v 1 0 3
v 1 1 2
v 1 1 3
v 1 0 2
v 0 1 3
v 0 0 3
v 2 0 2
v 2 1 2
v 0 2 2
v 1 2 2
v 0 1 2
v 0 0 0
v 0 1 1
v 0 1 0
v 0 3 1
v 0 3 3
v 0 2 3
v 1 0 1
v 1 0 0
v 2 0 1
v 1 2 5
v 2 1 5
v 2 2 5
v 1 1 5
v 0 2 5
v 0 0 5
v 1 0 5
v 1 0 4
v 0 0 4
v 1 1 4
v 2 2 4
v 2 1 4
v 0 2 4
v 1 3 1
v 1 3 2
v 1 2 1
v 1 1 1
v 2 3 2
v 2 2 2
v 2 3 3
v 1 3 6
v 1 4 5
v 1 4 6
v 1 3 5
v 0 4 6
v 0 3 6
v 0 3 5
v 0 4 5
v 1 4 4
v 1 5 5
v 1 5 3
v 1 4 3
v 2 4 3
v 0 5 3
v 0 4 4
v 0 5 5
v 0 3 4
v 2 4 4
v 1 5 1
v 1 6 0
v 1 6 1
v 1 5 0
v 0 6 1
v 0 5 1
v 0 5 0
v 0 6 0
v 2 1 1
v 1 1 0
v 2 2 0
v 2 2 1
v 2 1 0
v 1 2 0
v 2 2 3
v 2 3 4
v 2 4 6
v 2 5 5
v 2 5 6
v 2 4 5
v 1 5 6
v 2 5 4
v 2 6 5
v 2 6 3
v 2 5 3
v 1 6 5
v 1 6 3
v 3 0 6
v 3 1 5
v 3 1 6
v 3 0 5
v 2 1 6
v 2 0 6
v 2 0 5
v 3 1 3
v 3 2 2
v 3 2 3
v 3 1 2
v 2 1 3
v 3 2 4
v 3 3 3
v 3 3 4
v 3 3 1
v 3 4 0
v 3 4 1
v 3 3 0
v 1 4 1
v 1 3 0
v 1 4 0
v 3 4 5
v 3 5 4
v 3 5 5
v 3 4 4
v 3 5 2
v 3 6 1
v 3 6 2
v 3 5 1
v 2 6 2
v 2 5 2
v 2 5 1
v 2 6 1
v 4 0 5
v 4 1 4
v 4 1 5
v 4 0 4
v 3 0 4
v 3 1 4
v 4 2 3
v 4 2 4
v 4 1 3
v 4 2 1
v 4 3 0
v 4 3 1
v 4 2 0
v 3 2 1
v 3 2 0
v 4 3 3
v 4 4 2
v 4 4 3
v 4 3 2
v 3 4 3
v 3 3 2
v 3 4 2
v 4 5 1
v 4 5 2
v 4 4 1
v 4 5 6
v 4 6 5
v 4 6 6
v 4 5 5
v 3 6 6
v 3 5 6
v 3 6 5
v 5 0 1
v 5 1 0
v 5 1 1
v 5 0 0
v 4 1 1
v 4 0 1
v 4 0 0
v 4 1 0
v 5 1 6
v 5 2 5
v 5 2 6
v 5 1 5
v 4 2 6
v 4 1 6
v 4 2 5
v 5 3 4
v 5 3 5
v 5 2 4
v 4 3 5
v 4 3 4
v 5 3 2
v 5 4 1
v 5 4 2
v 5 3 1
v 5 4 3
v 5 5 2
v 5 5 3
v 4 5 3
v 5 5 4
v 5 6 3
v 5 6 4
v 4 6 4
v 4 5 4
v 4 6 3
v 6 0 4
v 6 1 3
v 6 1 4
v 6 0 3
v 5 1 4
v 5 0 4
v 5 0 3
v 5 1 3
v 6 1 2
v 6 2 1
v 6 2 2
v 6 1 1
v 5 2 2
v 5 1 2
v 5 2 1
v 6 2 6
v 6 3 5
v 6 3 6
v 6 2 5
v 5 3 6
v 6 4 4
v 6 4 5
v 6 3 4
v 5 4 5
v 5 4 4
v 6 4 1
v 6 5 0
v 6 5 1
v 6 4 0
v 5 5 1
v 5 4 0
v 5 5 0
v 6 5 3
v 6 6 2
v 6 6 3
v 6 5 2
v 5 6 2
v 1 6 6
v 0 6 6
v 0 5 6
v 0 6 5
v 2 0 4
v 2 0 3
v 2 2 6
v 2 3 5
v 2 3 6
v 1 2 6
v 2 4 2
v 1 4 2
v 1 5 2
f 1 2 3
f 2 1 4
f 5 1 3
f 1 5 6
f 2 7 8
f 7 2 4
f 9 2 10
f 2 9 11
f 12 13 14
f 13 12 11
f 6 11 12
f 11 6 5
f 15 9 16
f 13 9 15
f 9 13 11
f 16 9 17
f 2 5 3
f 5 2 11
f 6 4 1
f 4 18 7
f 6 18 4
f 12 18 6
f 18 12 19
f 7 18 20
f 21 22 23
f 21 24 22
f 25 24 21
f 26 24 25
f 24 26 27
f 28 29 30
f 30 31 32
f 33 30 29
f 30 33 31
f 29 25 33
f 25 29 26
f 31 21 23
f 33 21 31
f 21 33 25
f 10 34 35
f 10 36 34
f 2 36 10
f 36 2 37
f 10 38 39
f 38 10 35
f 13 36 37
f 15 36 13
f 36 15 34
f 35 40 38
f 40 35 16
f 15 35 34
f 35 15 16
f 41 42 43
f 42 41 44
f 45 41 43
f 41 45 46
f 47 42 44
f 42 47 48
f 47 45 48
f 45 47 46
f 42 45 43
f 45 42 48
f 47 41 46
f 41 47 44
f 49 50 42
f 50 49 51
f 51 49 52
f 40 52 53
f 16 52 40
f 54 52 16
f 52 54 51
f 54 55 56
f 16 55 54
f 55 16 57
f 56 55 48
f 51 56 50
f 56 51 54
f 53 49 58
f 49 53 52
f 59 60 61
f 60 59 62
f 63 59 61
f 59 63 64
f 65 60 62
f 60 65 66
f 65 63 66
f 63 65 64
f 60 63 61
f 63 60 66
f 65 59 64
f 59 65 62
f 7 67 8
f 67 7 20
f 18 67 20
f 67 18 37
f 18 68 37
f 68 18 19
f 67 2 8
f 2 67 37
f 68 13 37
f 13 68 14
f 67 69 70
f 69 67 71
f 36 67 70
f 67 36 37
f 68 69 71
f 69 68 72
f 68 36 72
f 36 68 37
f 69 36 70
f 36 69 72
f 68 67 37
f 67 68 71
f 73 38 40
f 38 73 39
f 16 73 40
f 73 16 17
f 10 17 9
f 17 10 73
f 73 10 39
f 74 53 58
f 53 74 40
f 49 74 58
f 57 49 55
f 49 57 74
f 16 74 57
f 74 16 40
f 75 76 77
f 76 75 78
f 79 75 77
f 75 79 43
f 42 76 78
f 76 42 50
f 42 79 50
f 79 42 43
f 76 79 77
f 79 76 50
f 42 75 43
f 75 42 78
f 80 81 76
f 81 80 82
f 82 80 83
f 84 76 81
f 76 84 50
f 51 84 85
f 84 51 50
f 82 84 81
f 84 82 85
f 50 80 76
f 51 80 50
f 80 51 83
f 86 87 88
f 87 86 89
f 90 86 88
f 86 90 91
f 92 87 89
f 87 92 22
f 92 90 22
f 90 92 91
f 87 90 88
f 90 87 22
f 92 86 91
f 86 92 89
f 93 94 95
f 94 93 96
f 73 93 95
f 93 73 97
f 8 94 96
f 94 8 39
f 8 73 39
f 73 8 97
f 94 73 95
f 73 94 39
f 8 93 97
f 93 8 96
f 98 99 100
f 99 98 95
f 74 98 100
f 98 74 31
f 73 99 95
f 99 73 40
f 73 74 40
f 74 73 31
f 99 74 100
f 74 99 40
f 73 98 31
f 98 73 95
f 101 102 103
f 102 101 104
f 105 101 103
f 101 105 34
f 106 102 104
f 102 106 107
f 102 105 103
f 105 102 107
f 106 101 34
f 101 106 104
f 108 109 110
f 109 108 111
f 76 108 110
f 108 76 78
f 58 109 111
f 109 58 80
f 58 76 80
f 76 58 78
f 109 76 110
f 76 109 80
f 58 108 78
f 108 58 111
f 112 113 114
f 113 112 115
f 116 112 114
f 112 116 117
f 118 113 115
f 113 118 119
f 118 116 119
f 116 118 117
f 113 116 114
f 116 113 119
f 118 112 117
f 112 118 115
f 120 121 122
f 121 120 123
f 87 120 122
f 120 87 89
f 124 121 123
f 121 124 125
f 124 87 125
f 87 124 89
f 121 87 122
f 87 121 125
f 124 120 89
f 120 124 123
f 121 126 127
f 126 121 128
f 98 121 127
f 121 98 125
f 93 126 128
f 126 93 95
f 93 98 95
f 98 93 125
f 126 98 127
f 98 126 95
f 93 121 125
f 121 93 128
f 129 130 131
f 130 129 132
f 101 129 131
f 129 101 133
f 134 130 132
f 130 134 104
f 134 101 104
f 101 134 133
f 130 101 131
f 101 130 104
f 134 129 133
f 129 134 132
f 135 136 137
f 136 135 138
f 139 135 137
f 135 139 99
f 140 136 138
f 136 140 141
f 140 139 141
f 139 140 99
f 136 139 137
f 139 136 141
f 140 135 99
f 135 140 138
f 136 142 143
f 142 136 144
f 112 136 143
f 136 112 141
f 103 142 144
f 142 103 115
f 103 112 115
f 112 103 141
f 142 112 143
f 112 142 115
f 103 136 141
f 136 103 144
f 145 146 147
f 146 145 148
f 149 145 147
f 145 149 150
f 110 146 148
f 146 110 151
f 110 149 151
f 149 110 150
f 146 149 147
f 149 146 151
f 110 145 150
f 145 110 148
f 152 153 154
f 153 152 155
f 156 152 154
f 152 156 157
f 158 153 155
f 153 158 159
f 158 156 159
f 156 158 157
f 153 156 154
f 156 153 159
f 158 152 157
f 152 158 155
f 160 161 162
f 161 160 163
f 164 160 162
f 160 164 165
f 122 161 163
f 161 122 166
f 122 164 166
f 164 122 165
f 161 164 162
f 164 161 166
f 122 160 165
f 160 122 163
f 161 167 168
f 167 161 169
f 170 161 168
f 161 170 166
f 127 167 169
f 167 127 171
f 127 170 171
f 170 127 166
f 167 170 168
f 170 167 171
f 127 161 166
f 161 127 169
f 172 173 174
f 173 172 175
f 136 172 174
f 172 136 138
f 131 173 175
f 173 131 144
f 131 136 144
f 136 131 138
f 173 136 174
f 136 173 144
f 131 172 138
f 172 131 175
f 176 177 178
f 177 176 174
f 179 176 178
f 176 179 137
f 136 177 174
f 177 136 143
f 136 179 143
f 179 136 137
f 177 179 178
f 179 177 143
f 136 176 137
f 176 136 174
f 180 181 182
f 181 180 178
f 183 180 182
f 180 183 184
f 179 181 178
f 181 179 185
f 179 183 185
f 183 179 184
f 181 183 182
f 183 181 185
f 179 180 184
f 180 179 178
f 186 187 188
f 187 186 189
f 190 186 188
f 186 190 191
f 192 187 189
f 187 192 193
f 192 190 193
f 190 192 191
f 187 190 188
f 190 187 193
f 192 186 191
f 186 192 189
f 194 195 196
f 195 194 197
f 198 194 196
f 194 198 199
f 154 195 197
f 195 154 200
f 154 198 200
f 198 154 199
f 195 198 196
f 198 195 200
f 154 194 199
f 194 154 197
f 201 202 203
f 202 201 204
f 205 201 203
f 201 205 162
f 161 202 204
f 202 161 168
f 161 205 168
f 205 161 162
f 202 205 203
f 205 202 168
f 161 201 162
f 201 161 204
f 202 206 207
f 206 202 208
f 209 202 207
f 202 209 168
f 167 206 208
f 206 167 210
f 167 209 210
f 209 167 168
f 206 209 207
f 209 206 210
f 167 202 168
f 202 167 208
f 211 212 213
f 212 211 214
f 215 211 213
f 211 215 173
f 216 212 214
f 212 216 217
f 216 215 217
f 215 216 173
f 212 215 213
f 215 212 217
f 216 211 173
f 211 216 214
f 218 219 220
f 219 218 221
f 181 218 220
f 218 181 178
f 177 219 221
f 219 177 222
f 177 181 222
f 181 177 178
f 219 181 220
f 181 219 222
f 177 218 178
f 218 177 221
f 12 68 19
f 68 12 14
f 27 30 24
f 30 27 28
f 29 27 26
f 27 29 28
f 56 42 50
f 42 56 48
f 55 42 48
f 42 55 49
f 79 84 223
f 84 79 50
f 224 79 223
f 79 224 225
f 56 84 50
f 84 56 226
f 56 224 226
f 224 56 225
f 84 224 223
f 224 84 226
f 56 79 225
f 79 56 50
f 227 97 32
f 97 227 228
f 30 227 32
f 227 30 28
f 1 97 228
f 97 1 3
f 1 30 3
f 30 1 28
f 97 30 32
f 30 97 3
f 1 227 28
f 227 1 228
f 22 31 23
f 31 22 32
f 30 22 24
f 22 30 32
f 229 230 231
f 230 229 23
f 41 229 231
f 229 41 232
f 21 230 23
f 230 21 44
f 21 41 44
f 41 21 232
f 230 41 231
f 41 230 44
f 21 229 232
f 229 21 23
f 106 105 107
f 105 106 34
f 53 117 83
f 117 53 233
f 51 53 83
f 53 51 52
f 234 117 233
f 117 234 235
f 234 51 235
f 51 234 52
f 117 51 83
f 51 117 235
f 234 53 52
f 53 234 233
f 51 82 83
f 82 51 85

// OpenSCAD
union() {
    translate([0, 0, 2]) cube([1, 1, 1]);
    translate([0, 1, 4]) cube([1, 1, 1]);
    translate([0, 2, 1]) cube([1, 1, 1]);
    translate([0, 3, 5]) cube([1, 1, 1]);
    translate([0, 4, 3]) cube([1, 1, 1]);
    translate([0, 5, 0]) cube([1, 1, 1]);
    translate([1, 0, 1]) cube([1, 1, 1]);
    translate([1, 1, 0]) cube([1, 1, 1]);
    translate([1, 2, 2]) cube([1, 1, 1]);
    translate([1, 3, 3]) cube([1, 1, 1]);
    translate([1, 4, 5]) cube([1, 1, 1]);
    translate([1, 5, 4]) cube([1, 1, 1]);
    translate([2, 0, 5]) cube([1, 1, 1]);
    translate([2, 1, 2]) cube([1, 1, 1]);
    translate([2, 2, 3]) cube([1, 1, 1]);
    translate([2, 3, 0]) cube([1, 1, 1]);
    translate([2, 4, 4]) cube([1, 1, 1]);
    translate([2, 5, 1]) cube([1, 1, 1]);
    translate([3, 0, 4]) cube([1, 1, 1]);
    translate([3, 1, 3]) cube([1, 1, 1]);
    translate([3, 2, 0]) cube([1, 1, 1]);
    translate([3, 3, 2]) cube([1, 1, 1]);
    translate([3, 4, 1]) cube([1, 1, 1]);
    translate([3, 5, 5]) cube([1, 1, 1]);
    translate([4, 0, 0]) cube([1, 1, 1]);
    translate([4, 1, 5]) cube([1, 1, 1]);
    translate([4, 2, 4]) cube([1, 1, 1]);
    translate([4, 3, 1]) cube([1, 1, 1]);
    translate([4, 4, 2]) cube([1, 1, 1]);
    translate([4, 5, 3]) cube([1, 1, 1]);
    translate([5, 0, 3]) cube([1, 1, 1]);
    translate([5, 1, 1]) cube([1, 1, 1]);
    translate([5, 2, 5]) cube([1, 1, 1]);
    translate([5, 3, 4]) cube([1, 1, 1]);
    translate([5, 4, 0]) cube([1, 1, 1]);
    translate([5, 5, 2]) cube([1, 1, 1]);
    translate([0, 0, 0]) cube([1, 1, 1]);
    translate([0, 0, 1]) cube([1, 1, 1]);
    translate([0, 0, 4]) cube([1, 1, 1]);
    translate([0, 1, 1]) cube([1, 1, 1]);
    translate([0, 2, 2]) cube([1, 1, 1]);
    translate([0, 3, 3]) cube([1, 1, 1]);
    translate([0, 4, 4]) cube([1, 1, 1]);
    translate([0, 5, 5]) cube([1, 1, 1]);
    translate([1, 0, 3]) cube([1, 1, 1]);
    translate([1, 1, 4]) cube([1, 1, 1]);
    translate([1, 2, 5]) cube([1, 1, 1]);
    translate([1, 3, 0]) cube([1, 1, 1]);
    translate([1, 4, 2]) cube([1, 1, 1]);
    translate([1, 5, 3]) cube([1, 1, 1]);
}
